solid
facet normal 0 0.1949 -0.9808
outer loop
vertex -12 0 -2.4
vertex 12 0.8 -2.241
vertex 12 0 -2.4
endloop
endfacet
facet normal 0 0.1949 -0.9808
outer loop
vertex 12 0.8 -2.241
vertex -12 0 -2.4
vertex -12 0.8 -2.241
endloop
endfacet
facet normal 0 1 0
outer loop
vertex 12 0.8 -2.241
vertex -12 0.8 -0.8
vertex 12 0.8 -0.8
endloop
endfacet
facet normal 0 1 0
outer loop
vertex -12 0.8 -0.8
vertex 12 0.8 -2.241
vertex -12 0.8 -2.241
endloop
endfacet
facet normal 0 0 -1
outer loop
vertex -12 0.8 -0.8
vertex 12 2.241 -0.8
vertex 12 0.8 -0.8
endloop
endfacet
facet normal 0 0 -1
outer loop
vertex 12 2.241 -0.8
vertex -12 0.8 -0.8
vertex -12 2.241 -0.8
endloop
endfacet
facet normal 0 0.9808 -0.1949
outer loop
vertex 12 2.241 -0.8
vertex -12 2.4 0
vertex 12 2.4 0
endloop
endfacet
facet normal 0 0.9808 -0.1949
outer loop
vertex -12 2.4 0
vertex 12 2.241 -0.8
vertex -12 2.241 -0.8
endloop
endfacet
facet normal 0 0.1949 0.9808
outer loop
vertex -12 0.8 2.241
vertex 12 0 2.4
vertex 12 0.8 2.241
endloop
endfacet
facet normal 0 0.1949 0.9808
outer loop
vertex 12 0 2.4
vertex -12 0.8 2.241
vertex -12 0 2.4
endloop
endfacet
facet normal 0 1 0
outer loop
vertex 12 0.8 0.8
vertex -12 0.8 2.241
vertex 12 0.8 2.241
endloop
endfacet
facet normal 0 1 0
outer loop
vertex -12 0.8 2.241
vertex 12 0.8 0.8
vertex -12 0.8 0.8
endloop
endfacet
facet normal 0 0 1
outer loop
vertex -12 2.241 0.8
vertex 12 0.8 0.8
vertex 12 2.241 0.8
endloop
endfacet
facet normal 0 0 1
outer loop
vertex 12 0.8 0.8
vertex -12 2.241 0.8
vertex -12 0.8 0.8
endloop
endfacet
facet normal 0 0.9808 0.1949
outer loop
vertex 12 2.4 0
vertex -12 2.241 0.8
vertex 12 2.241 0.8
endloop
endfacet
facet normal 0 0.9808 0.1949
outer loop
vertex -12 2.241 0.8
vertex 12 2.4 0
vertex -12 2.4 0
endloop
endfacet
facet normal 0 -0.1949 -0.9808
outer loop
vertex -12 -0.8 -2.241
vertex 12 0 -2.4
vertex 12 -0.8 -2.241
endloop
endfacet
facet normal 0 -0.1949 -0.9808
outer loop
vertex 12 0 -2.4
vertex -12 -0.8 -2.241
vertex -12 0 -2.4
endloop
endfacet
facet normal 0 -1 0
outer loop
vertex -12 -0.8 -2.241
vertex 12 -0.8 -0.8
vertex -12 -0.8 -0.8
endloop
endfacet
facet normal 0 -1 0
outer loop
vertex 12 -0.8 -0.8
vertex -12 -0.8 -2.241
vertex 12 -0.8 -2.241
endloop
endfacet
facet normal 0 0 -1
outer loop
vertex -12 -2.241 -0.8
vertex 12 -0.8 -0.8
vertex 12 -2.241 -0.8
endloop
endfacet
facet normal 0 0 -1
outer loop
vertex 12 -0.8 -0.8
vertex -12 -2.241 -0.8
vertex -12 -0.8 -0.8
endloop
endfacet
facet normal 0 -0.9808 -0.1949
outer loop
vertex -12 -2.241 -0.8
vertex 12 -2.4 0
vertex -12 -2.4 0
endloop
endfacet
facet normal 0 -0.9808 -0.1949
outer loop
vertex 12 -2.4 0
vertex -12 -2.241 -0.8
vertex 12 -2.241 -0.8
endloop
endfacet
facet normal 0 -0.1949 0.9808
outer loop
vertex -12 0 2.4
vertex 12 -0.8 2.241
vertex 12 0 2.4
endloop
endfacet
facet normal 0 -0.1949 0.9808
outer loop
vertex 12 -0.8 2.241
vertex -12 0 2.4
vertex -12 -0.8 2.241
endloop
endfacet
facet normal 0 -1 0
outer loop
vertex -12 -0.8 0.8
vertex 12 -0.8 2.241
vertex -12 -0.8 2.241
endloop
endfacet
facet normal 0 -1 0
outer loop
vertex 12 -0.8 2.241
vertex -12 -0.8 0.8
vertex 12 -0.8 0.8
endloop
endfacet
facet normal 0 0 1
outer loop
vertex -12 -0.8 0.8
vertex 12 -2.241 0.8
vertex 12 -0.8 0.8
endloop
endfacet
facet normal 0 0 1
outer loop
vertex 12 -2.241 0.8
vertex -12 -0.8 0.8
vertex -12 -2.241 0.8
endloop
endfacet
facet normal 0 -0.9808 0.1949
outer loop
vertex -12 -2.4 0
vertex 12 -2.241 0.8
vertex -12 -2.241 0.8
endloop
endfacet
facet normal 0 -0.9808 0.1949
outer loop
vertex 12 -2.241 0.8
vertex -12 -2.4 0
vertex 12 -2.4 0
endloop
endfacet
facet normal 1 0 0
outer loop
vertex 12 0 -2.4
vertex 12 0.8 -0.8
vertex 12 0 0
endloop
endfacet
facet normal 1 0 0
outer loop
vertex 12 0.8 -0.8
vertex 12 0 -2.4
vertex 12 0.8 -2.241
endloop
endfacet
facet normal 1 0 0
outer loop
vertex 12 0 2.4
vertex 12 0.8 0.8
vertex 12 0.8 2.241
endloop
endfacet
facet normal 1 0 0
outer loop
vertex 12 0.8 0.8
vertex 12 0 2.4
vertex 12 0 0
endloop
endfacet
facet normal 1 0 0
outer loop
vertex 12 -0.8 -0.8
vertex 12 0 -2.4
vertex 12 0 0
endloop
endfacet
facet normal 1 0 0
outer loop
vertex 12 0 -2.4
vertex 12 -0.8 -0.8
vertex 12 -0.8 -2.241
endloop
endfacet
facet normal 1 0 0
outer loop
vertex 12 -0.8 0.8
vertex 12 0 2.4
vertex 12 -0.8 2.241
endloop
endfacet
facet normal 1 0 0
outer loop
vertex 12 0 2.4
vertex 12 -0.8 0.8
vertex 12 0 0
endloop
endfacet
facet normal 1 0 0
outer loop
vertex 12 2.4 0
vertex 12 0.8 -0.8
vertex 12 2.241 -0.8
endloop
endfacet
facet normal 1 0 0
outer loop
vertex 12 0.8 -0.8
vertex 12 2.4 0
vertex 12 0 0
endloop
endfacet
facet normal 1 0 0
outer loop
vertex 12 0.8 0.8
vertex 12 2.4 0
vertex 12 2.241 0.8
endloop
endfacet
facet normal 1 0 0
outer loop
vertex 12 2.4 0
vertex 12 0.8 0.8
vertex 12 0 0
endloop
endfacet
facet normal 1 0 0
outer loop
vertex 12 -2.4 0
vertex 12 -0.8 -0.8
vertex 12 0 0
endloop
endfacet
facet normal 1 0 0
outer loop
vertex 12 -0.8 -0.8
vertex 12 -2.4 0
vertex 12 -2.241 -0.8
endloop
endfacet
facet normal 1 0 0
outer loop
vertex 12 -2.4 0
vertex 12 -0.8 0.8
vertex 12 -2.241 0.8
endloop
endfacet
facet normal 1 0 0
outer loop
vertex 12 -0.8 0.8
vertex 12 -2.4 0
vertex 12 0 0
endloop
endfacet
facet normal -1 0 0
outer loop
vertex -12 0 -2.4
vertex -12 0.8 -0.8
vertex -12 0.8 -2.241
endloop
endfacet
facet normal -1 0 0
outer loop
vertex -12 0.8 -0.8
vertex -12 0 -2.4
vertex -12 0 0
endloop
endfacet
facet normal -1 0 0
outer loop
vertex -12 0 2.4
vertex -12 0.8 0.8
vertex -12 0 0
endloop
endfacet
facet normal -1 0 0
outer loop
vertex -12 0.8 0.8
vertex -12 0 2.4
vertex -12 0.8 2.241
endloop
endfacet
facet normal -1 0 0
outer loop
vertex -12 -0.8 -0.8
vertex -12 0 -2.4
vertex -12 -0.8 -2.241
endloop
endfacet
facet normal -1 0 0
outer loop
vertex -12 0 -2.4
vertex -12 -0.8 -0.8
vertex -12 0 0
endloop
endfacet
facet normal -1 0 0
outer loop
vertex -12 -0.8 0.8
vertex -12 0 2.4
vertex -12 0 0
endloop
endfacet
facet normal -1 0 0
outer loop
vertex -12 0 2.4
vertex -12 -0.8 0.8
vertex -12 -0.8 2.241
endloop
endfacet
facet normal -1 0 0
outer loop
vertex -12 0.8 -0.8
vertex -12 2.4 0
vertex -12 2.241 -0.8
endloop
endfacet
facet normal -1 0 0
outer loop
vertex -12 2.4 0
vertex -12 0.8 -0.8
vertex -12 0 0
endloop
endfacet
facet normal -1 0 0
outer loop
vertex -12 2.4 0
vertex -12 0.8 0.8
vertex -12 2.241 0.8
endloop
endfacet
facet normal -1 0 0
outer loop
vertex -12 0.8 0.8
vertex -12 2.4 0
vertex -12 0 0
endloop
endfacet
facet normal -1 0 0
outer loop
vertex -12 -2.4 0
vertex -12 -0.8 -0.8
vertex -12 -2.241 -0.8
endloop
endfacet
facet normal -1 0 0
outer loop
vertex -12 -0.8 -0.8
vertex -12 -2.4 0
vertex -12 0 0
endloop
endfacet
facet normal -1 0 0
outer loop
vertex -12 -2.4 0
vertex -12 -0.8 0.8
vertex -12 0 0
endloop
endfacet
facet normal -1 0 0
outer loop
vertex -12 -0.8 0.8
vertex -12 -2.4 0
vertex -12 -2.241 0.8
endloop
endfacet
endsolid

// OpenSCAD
// file: ../p/axle.scad
use <../lib.scad>
function ldraw_lib__axle() = [
// 0 Axle
// 0 Name: axle.dat
// 0 Author: James Jessiman
// 0 !LDRAW_ORG Primitive UPDATE 2003-01
// 0 !LICENSE Licensed under CC BY 4.0 : see CAreadme.txt
// 
// 0 BFC CERTIFY CCW
  [0,"BFC","CERTIFY"],
  [0,"BFC","CCW"],
// 
// 0 !HISTORY 2000-04-23 [sbliss] Added conditional edges along outermost diameters
// 0 !HISTORY 2000-05-07 [PTadmin] Official Update 2000-01
// 0 !HISTORY 2002-11-08 [OrionP] Adjusted fit and precision
// 0 !HISTORY 2003-03-12 [PTadmin] Official Update 2003-01
// 0 !HISTORY 2007-06-24 [PTadmin] Header formatted for Contributor Agreement
// 0 !HISTORY 2008-07-01 [PTadmin] Official Update 2008-01
// 
// 
// 5 24 6 0 0 6 1 0 5.602 0 2 5.602 0 -2
  [5,24,6,0,0,6,1,0,5.602,0,2,5.602,0,-2],
// 5 24 0 0 6 0 1 6 2 0 5.602 -2 0 5.602
  [5,24,0,0,6,0,1,6,2,0,5.602,-2,0,5.602],
// 5 24 -6 0 0 -6 1 0 -5.602 0 -2 -5.602 0 2
  [5,24,-6,0,0,-6,1,0,-5.602,0,-2,-5.602,0,2],
// 5 24 0 0 -6 0 1 -6 -2 0 -5.602 2 0 -5.602
  [5,24,0,0,-6,0,1,-6,-2,0,-5.602,2,0,-5.602],
// 
// 2 24 6 0 0 5.602 0 2
  [2,24,6,0,0,5.602,0,2],
// 2 24 5.602 0 2 2 0 2
  [2,24,5.602,0,2,2,0,2],
// 2 24 2 0 2 2 0 5.602
  [2,24,2,0,2,2,0,5.602],
// 2 24 2 0 5.602 0 0 6
  [2,24,2,0,5.602,0,0,6],
// 2 24 -6 0 0 -5.602 0 2
  [2,24,-6,0,0,-5.602,0,2],
// 2 24 -5.602 0 2 -2 0 2
  [2,24,-5.602,0,2,-2,0,2],
// 2 24 -2 0 2 -2 0 5.602
  [2,24,-2,0,2,-2,0,5.602],
// 2 24 -2 0 5.602 -0 0 6
  [2,24,-2,0,5.602,-0,0,6],
// 2 24 6 0 -0 5.602 0 -2
  [2,24,6,0,-0,5.602,0,-2],
// 2 24 5.602 0 -2 2 0 -2
  [2,24,5.602,0,-2,2,0,-2],
// 2 24 2 0 -2 2 0 -5.602
  [2,24,2,0,-2,2,0,-5.602],
// 2 24 2 0 -5.602 0 0 -6
  [2,24,2,0,-5.602,0,0,-6],
// 2 24 -6 0 -0 -5.602 0 -2
  [2,24,-6,0,-0,-5.602,0,-2],
// 2 24 -5.602 0 -2 -2 0 -2
  [2,24,-5.602,0,-2,-2,0,-2],
// 2 24 -2 0 -2 -2 0 -5.602
  [2,24,-2,0,-2,-2,0,-5.602],
// 2 24 -2 0 -5.602 -0 0 -6
  [2,24,-2,0,-5.602,-0,0,-6],
// 2 24 6 1 0 5.602 1 2
  [2,24,6,1,0,5.602,1,2],
// 2 24 5.602 1 2 2 1 2
  [2,24,5.602,1,2,2,1,2],
// 2 24 2 1 2 2 1 5.602
  [2,24,2,1,2,2,1,5.602],
// 2 24 2 1 5.602 0 1 6
  [2,24,2,1,5.602,0,1,6],
// 2 24 -6 1 0 -5.602 1 2
  [2,24,-6,1,0,-5.602,1,2],
// 2 24 -5.602 1 2 -2 1 2
  [2,24,-5.602,1,2,-2,1,2],
// 2 24 -2 1 2 -2 1 5.602
  [2,24,-2,1,2,-2,1,5.602],
// 2 24 -2 1 5.602 -0 1 6
  [2,24,-2,1,5.602,-0,1,6],
// 2 24 6 1 -0 5.602 1 -2
  [2,24,6,1,-0,5.602,1,-2],
// 2 24 5.602 1 -2 2 1 -2
  [2,24,5.602,1,-2,2,1,-2],
// 2 24 2 1 -2 2 1 -5.602
  [2,24,2,1,-2,2,1,-5.602],
// 2 24 2 1 -5.602 0 1 -6
  [2,24,2,1,-5.602,0,1,-6],
// 2 24 -6 1 -0 -5.602 1 -2
  [2,24,-6,1,-0,-5.602,1,-2],
// 2 24 -5.602 1 -2 -2 1 -2
  [2,24,-5.602,1,-2,-2,1,-2],
// 2 24 -2 1 -2 -2 1 -5.602
  [2,24,-2,1,-2,-2,1,-5.602],
// 2 24 -2 1 -5.602 -0 1 -6
  [2,24,-2,1,-5.602,-0,1,-6],
// 
// 2 24 5.602 0 2 5.602 1 2
  [2,24,5.602,0,2,5.602,1,2],
// 2 24 2 0 2 2 1 2
  [2,24,2,0,2,2,1,2],
// 2 24 2 0 5.602 2 1 5.602
  [2,24,2,0,5.602,2,1,5.602],
// 2 24 -5.602 0 2 -5.602 1 2
  [2,24,-5.602,0,2,-5.602,1,2],
// 2 24 -2 0 2 -2 1 2
  [2,24,-2,0,2,-2,1,2],
// 2 24 -2 0 5.602 -2 1 5.602
  [2,24,-2,0,5.602,-2,1,5.602],
// 2 24 5.602 0 -2 5.602 1 -2
  [2,24,5.602,0,-2,5.602,1,-2],
// 2 24 2 0 -2 2 1 -2
  [2,24,2,0,-2,2,1,-2],
// 2 24 2 0 -5.602 2 1 -5.602
  [2,24,2,0,-5.602,2,1,-5.602],
// 2 24 -5.602 0 -2 -5.602 1 -2
  [2,24,-5.602,0,-2,-5.602,1,-2],
// 2 24 -2 0 -2 -2 1 -2
  [2,24,-2,0,-2,-2,1,-2],
// 2 24 -2 0 -5.602 -2 1 -5.602
  [2,24,-2,0,-5.602,-2,1,-5.602],
// 
// 4 16 6 0 0 6 1 0 5.602 1 2 5.602 0 2
  [4,16,6,0,0,6,1,0,5.602,1,2,5.602,0,2],
// 4 16 5.602 0 2 5.602 1 2 2 1 2 2 0 2
  [4,16,5.602,0,2,5.602,1,2,2,1,2,2,0,2],
// 4 16 2 0 2 2 1 2 2 1 5.602 2 0 5.602
  [4,16,2,0,2,2,1,2,2,1,5.602,2,0,5.602],
// 4 16 2 0 5.602 2 1 5.602 0 1 6 0 0 6
  [4,16,2,0,5.602,2,1,5.602,0,1,6,0,0,6],
// 4 16 -6 0 0 -5.602 0 2 -5.602 1 2 -6 1 0
  [4,16,-6,0,0,-5.602,0,2,-5.602,1,2,-6,1,0],
// 4 16 -5.602 0 2 -2 0 2 -2 1 2 -5.602 1 2
  [4,16,-5.602,0,2,-2,0,2,-2,1,2,-5.602,1,2],
// 4 16 -2 0 2 -2 0 5.602 -2 1 5.602 -2 1 2
  [4,16,-2,0,2,-2,0,5.602,-2,1,5.602,-2,1,2],
// 4 16 -2 0 5.602 -0 0 6 -0 1 6 -2 1 5.602
  [4,16,-2,0,5.602,-0,0,6,-0,1,6,-2,1,5.602],
// 4 16 6 0 -0 5.602 0 -2 5.602 1 -2 6 1 -0
  [4,16,6,0,-0,5.602,0,-2,5.602,1,-2,6,1,-0],
// 4 16 5.602 0 -2 2 0 -2 2 1 -2 5.602 1 -2
  [4,16,5.602,0,-2,2,0,-2,2,1,-2,5.602,1,-2],
// 4 16 2 0 -2 2 0 -5.602 2 1 -5.602 2 1 -2
  [4,16,2,0,-2,2,0,-5.602,2,1,-5.602,2,1,-2],
// 4 16 2 0 -5.602 0 0 -6 0 1 -6 2 1 -5.602
  [4,16,2,0,-5.602,0,0,-6,0,1,-6,2,1,-5.602],
// 4 16 -6 0 -0 -6 1 -0 -5.602 1 -2 -5.602 0 -2
  [4,16,-6,0,-0,-6,1,-0,-5.602,1,-2,-5.602,0,-2],
// 4 16 -5.602 0 -2 -5.602 1 -2 -2 1 -2 -2 0 -2
  [4,16,-5.602,0,-2,-5.602,1,-2,-2,1,-2,-2,0,-2],
// 4 16 -2 0 -2 -2 1 -2 -2 1 -5.602 -2 0 -5.602
  [4,16,-2,0,-2,-2,1,-2,-2,1,-5.602,-2,0,-5.602],
// 4 16 -2 0 -5.602 -2 1 -5.602 -0 1 -6 -0 0 -6
  [4,16,-2,0,-5.602,-2,1,-5.602,-0,1,-6,-0,0,-6],
// 
// 4 16 6 0 0 5.602 0 2 2 0 2 0 0 0
  [4,16,6,0,0,5.602,0,2,2,0,2,0,0,0],
// 4 16 -6 0 0 0 0 0 -2 0 2 -5.602 0 2
  [4,16,-6,0,0,0,0,0,-2,0,2,-5.602,0,2],
// 4 16 6 0 0 0 0 0 2 0 -2 5.602 0 -2
  [4,16,6,0,0,0,0,0,2,0,-2,5.602,0,-2],
// 4 16 -6 0 0 -5.602 0 -2 -2 0 -2 0 0 0
  [4,16,-6,0,0,-5.602,0,-2,-2,0,-2,0,0,0],
// 4 16 0 0 6 0 0 0 2 0 2 2 0 5.602
  [4,16,0,0,6,0,0,0,2,0,2,2,0,5.602],
// 4 16 0 0 6 -2 0 5.602 -2 0 2 0 0 0
  [4,16,0,0,6,-2,0,5.602,-2,0,2,0,0,0],
// 4 16 0 0 -6 2 0 -5.602 2 0 -2 0 0 0
  [4,16,0,0,-6,2,0,-5.602,2,0,-2,0,0,0],
// 4 16 0 0 -6 0 0 0 -2 0 -2 -2 0 -5.602
  [4,16,0,0,-6,0,0,0,-2,0,-2,-2,0,-5.602],
// 4 16 6 1 0 0 1 0 2 1 2 5.602 1 2
  [4,16,6,1,0,0,1,0,2,1,2,5.602,1,2],
// 4 16 -6 1 0 -5.602 1 2 -2 1 2 0 1 0
  [4,16,-6,1,0,-5.602,1,2,-2,1,2,0,1,0],
// 4 16 6 1 0 5.602 1 -2 2 1 -2 0 1 0
  [4,16,6,1,0,5.602,1,-2,2,1,-2,0,1,0],
// 4 16 -6 1 0 0 1 0 -2 1 -2 -5.602 1 -2
  [4,16,-6,1,0,0,1,0,-2,1,-2,-5.602,1,-2],
// 4 16 0 1 6 2 1 5.602 2 1 2 0 1 0
  [4,16,0,1,6,2,1,5.602,2,1,2,0,1,0],
// 4 16 0 1 6 0 1 0 -2 1 2 -2 1 5.602
  [4,16,0,1,6,0,1,0,-2,1,2,-2,1,5.602],
// 4 16 0 1 -6 0 1 0 2 1 -2 2 1 -5.602
  [4,16,0,1,-6,0,1,0,2,1,-2,2,1,-5.602],
// 4 16 0 1 -6 -2 1 -5.602 -2 1 -2 0 1 0
  [4,16,0,1,-6,-2,1,-5.602,-2,1,-2,0,1,0],
// 0
];
module ldraw_lib__axle(step=0, col=false, unit=2/5, alt=false, line=0.2, solid=!$preview)
    makepoly(ldraw_lib__axle(), step=step, col=col, unit=unit, alt=alt, line=line, solid=solid);
ldraw_lib__axle(line=0.2);
// file: 4519.scad
use <../lib.scad>
use <../p/axle.scad>
function ldraw_lib__4519() = [
// 0 Technic Axle  3
// 0 Name: 4519.dat
// 0 Author: James Jessiman
// 0 !LDRAW_ORG Part UPDATE 2005-01
// 0 !LICENSE Licensed under CC BY 2.0 and CC BY 4.0 : see CAreadme.txt
// 
// 0 BFC CERTIFY CCW
  [0,"BFC","CERTIFY"],
  [0,"BFC","CCW"],
// 
// 0 !HISTORY 2004-07-11 [guyvivan] BFC'ed
// 0 !HISTORY 2005-12-28 [PTadmin] Official Update 2005-01
// 0 !HISTORY 2007-07-08 [PTadmin] Header formatted for Contributor Agreement
// 0 !HISTORY 2008-07-01 [PTadmin] Official Update 2008-01
// 
// 
// 1 16 30 0 0 0 -60 0 1 0 0 0 0 1 axle.dat
  [1,16,30,0,0,0,-60,0,1,0,0,0,0,1, ldraw_lib__axle()],
// 0
// 
];
module ldraw_lib__4519(step=0, col=false, unit=2/5, alt=false, line=0.2, solid=!$preview)
    makepoly(ldraw_lib__4519(), step=step, col=col, unit=unit, alt=alt, line=line, solid=solid);
ldraw_lib__4519(line=0.2);
// main file
use <../lib.scad>
use <4519.scad>
function ldraw_lib__4211815() = [
// 0 ~_Technic Axle  3 Light Bluish Grey (Obsolete)
// 0 Name: 4211815.dat
// 0 Author: Michael Heidemann [mikeheide]
// 0 !LDRAW_ORG Part Physical_Colour UPDATE 2022-01
// 0 !LICENSE Licensed under CC BY 4.0 : see CAreadme.txt
// 
// 0 BFC CERTIFY CCW
  [0,"BFC","CERTIFY"],
  [0,"BFC","CCW"],
// 
// 0 !HISTORY 2012-03-30 [PTadmin] Official Update 2012-01
// 0 !HISTORY 2019-08-16 [Holly-Wood] Obsoleted per decision not to include physical colour parts
// 0 !HISTORY 2019-09-09 [PTadmin] Official Update 2019-02
// 0 !HISTORY 2021-01-16 [cwdee] Update description
// 0 !HISTORY 2022-01-14 [PTadmin] Official Update 2022-01
// 
// 
// 0 // This file is a "shortcut" with the correct number for the actual
// 0 // colouring of the part (Light_Bluish_Grey).
// 
// 1 71 0 0 0 1 0 0 0 1 0 0 0 1 4519.dat
  [1,71,0,0,0,1,0,0,0,1,0,0,0,1, ldraw_lib__4519()],
];
module ldraw_lib__4211815(step=0, col=false, unit=2/5, alt=false, line=0.2, solid=!$preview)
    makepoly(ldraw_lib__4211815(), step=step, col=col, unit=unit, alt=alt, line=line, solid=solid);
ldraw_lib__4211815(line=0.2);
